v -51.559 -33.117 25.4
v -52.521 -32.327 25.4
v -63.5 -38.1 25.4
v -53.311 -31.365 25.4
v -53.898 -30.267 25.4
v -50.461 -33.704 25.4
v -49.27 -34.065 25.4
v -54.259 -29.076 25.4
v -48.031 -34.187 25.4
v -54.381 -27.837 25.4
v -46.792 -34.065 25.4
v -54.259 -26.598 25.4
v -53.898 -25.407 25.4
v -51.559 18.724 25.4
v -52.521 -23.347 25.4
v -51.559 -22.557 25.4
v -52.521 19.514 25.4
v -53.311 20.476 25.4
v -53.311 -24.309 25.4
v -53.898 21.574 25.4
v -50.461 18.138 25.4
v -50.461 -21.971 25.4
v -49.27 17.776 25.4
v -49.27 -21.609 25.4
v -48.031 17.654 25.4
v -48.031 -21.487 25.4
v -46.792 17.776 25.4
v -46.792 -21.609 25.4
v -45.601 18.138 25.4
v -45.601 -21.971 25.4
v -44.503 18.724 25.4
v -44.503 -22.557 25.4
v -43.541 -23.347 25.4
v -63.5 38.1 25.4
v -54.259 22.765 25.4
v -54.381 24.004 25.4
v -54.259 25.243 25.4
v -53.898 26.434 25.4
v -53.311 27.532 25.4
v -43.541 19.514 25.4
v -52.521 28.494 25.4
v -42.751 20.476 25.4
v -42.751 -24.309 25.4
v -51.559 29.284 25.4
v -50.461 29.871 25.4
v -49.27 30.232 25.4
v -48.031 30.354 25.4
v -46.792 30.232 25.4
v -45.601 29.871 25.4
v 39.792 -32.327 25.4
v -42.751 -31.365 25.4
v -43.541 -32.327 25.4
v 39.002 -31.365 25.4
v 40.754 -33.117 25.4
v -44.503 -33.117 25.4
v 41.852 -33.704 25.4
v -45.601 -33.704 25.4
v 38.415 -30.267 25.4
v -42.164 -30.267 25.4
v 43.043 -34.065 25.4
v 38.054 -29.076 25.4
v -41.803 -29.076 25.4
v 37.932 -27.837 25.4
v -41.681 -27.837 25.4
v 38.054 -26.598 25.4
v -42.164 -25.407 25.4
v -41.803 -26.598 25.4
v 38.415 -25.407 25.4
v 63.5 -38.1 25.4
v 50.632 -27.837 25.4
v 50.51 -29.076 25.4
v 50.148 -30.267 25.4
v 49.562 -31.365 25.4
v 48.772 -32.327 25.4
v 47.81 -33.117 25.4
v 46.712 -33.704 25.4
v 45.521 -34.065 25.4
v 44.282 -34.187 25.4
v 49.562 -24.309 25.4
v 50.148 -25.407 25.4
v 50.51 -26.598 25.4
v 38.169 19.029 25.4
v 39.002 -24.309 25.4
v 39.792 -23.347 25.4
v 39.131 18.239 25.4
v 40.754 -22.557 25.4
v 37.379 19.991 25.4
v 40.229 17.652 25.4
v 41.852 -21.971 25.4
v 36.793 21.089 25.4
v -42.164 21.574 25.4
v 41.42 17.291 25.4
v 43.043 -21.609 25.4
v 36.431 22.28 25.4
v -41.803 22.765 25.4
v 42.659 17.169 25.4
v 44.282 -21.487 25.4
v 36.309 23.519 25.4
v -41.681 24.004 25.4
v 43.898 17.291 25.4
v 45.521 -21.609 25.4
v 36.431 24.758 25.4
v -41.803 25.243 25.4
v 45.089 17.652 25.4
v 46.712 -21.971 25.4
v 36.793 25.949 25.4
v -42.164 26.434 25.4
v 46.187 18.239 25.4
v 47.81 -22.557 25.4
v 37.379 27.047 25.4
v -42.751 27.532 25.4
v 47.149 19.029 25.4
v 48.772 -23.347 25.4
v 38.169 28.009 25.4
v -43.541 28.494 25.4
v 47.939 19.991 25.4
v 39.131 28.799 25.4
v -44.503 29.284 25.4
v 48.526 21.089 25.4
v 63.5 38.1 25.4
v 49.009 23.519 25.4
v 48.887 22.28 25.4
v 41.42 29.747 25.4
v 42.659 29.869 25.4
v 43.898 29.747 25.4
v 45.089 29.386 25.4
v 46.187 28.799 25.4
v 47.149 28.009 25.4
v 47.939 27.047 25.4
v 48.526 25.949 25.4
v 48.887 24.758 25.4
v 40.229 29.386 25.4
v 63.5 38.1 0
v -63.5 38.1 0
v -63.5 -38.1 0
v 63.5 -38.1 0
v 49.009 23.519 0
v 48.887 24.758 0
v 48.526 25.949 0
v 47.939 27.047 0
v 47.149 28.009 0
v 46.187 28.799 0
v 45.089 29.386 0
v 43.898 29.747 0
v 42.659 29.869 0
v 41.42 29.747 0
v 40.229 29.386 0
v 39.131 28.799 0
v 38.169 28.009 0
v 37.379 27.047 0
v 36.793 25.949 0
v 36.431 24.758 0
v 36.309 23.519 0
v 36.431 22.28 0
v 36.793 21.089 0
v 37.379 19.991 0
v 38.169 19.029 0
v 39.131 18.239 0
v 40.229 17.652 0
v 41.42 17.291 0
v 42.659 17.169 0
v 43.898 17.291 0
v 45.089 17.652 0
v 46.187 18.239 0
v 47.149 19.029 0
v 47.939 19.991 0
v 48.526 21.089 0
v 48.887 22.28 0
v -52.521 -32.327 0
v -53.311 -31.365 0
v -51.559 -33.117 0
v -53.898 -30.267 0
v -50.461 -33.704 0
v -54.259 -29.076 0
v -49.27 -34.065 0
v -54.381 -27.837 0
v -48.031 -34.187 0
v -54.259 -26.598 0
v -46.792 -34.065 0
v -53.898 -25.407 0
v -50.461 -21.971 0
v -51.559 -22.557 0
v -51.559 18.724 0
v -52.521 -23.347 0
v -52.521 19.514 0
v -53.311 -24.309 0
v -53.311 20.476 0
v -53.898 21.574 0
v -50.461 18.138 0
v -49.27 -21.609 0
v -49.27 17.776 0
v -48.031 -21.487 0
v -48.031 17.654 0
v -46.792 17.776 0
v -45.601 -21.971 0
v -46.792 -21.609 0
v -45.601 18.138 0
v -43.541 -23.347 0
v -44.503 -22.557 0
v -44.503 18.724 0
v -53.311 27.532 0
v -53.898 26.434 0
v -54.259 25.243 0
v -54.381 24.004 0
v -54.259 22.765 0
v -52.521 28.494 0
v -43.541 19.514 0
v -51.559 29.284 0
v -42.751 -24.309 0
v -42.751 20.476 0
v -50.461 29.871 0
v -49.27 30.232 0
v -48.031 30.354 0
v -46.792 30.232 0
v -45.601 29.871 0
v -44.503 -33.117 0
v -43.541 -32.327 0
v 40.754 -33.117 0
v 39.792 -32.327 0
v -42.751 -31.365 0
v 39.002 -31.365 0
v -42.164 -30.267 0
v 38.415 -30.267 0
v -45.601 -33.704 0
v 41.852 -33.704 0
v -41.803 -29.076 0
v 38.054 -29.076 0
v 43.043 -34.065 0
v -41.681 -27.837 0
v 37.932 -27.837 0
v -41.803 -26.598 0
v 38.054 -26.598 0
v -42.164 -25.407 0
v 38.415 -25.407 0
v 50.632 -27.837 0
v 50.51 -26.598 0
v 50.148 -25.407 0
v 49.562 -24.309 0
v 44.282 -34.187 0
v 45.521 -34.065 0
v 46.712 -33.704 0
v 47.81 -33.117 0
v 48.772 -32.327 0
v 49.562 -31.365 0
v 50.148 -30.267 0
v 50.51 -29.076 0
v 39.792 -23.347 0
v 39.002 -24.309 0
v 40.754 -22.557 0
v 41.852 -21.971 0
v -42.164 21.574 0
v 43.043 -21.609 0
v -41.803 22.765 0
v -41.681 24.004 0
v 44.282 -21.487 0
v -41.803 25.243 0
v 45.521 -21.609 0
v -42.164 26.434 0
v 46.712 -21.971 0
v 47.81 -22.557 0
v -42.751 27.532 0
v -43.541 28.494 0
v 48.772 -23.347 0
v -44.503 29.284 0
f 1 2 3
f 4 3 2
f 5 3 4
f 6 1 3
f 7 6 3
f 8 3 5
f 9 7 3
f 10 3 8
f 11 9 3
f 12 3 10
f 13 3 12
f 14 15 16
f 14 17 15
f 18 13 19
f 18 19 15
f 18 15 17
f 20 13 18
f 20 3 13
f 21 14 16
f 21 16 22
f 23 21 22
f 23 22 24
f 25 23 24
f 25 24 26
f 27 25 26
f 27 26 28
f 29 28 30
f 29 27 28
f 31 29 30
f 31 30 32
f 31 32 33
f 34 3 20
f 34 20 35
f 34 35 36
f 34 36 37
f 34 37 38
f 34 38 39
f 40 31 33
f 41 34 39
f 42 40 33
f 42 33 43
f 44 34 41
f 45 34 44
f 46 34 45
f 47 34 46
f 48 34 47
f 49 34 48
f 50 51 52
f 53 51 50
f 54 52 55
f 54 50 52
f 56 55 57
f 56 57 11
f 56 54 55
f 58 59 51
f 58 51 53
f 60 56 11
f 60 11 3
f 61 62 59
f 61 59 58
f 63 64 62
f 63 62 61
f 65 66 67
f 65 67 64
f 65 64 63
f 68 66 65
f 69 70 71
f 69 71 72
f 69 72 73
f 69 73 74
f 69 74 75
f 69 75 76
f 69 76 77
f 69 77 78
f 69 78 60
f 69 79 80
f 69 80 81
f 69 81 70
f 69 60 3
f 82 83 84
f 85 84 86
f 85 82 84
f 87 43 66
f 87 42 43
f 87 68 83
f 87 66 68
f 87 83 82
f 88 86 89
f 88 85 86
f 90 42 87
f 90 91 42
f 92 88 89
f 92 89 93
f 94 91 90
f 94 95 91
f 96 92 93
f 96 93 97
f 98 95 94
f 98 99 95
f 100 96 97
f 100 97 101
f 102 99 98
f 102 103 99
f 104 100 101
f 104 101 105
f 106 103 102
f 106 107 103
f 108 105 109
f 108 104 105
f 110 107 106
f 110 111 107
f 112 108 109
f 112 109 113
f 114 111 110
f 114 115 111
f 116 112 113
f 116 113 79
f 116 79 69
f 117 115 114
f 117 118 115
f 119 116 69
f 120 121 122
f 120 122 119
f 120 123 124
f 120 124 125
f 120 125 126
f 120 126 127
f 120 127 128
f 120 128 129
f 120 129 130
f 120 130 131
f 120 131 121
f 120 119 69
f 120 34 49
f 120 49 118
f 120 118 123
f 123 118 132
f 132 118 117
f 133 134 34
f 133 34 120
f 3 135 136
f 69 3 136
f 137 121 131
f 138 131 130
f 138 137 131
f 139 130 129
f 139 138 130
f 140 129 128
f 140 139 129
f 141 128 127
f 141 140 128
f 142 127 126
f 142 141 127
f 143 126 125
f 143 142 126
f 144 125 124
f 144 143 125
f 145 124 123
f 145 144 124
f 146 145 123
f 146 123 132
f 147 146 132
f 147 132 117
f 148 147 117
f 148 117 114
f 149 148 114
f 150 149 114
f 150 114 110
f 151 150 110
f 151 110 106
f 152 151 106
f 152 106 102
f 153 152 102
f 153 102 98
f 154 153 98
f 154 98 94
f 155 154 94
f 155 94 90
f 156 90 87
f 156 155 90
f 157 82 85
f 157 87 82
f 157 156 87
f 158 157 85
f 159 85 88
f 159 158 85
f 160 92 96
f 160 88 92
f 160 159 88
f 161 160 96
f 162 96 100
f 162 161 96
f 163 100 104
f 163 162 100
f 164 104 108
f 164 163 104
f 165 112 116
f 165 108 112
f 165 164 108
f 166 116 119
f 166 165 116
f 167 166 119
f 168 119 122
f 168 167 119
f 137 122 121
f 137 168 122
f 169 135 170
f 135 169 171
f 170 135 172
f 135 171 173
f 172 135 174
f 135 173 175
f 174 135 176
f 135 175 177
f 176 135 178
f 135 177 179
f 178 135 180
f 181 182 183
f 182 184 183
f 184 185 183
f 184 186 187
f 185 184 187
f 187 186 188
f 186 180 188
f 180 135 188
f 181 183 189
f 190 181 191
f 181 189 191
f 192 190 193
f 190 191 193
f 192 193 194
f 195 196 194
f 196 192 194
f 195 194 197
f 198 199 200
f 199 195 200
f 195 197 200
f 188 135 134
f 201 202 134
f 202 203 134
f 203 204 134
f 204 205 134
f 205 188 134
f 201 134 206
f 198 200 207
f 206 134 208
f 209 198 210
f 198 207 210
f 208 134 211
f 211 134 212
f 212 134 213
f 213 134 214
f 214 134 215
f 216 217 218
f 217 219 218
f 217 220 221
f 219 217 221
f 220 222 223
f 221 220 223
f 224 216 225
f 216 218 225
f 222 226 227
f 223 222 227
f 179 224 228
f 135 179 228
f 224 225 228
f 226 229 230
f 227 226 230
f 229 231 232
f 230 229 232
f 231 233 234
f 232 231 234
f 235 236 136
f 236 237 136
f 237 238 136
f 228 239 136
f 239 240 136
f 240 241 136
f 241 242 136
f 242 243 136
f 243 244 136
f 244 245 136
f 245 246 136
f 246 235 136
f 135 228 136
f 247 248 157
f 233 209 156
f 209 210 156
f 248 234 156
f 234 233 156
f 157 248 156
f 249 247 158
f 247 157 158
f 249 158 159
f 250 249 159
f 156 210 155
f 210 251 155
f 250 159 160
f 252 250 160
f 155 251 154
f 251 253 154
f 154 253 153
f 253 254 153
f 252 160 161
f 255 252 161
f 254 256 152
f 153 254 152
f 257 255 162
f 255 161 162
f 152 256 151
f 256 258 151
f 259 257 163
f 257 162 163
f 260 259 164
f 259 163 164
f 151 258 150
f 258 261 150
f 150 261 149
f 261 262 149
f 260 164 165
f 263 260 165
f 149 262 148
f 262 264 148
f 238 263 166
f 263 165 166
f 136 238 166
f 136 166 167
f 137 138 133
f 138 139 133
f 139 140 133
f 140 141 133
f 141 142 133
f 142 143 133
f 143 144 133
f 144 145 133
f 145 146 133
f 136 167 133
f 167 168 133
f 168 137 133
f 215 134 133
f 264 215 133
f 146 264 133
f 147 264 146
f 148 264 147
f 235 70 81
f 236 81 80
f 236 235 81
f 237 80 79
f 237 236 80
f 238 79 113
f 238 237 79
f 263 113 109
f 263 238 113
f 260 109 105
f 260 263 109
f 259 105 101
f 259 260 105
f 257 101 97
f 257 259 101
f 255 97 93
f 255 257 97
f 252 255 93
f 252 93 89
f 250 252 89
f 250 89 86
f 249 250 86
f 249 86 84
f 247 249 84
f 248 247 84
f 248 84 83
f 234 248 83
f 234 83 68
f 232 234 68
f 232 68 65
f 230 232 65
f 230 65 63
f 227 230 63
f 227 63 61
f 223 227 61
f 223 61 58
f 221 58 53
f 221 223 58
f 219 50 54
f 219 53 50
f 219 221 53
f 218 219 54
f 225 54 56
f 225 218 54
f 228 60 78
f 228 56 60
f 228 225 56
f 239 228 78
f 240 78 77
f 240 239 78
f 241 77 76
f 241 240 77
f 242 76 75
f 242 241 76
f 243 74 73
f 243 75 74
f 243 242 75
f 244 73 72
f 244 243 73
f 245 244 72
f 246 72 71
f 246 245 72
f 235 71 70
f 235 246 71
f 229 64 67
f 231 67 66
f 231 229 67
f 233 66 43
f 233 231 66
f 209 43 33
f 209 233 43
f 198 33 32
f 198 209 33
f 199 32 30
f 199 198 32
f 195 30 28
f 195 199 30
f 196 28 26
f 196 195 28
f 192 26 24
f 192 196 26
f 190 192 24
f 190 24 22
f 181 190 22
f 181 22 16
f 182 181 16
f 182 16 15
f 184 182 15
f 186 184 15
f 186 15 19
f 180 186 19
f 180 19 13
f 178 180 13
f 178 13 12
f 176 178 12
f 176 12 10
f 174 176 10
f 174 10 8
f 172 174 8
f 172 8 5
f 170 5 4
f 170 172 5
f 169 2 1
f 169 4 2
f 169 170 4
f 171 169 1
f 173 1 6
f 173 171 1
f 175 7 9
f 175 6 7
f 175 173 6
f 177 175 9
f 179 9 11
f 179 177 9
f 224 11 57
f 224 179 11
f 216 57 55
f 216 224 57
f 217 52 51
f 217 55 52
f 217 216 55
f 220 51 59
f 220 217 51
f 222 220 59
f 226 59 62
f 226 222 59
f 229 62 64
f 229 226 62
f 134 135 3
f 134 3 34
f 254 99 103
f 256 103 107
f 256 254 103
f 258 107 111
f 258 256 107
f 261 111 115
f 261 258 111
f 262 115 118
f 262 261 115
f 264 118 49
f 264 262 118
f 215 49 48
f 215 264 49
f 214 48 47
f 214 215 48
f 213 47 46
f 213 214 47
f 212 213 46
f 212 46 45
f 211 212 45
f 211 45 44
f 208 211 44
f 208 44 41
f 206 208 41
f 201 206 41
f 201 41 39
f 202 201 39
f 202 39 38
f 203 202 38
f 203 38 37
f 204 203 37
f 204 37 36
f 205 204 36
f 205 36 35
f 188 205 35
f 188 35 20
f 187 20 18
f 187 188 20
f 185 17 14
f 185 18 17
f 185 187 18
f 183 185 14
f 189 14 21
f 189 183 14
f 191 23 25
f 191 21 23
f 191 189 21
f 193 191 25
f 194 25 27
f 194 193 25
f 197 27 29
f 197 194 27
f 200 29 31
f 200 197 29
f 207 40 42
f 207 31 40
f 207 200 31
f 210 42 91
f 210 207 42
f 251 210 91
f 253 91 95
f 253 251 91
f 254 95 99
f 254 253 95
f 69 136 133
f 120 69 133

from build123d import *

# Parameters (mm, degrees)
F0_W     = 127
F0_H     = 76.2
F1_DEPTH = 25.4
F2_R     = 6.35
F3_DEPTH = 25.401


with BuildPart() as f1:
    # F0 (on Top) → F1 (new body)
    with BuildSketch(Plane.XY):
        Rectangle(F0_W, F0_H)
    extrude(amount=F1_DEPTH)

    # F2 (on Top) → F3 (cut, through all)
    with BuildSketch(Plane.XY):
        with Locations((-48.03089, -27.837213)):
            Circle(F2_R)
        with Locations((44.281855, -27.837213)):
            Circle(F2_R)
        with Locations((42.659267, 23.51901)):
            Circle(F2_R)
        with Locations((-48.03089, 24.004152)):
            Circle(F2_R)
    extrude(amount=F3_DEPTH, mode=Mode.SUBTRACT)


solid = f1.part
